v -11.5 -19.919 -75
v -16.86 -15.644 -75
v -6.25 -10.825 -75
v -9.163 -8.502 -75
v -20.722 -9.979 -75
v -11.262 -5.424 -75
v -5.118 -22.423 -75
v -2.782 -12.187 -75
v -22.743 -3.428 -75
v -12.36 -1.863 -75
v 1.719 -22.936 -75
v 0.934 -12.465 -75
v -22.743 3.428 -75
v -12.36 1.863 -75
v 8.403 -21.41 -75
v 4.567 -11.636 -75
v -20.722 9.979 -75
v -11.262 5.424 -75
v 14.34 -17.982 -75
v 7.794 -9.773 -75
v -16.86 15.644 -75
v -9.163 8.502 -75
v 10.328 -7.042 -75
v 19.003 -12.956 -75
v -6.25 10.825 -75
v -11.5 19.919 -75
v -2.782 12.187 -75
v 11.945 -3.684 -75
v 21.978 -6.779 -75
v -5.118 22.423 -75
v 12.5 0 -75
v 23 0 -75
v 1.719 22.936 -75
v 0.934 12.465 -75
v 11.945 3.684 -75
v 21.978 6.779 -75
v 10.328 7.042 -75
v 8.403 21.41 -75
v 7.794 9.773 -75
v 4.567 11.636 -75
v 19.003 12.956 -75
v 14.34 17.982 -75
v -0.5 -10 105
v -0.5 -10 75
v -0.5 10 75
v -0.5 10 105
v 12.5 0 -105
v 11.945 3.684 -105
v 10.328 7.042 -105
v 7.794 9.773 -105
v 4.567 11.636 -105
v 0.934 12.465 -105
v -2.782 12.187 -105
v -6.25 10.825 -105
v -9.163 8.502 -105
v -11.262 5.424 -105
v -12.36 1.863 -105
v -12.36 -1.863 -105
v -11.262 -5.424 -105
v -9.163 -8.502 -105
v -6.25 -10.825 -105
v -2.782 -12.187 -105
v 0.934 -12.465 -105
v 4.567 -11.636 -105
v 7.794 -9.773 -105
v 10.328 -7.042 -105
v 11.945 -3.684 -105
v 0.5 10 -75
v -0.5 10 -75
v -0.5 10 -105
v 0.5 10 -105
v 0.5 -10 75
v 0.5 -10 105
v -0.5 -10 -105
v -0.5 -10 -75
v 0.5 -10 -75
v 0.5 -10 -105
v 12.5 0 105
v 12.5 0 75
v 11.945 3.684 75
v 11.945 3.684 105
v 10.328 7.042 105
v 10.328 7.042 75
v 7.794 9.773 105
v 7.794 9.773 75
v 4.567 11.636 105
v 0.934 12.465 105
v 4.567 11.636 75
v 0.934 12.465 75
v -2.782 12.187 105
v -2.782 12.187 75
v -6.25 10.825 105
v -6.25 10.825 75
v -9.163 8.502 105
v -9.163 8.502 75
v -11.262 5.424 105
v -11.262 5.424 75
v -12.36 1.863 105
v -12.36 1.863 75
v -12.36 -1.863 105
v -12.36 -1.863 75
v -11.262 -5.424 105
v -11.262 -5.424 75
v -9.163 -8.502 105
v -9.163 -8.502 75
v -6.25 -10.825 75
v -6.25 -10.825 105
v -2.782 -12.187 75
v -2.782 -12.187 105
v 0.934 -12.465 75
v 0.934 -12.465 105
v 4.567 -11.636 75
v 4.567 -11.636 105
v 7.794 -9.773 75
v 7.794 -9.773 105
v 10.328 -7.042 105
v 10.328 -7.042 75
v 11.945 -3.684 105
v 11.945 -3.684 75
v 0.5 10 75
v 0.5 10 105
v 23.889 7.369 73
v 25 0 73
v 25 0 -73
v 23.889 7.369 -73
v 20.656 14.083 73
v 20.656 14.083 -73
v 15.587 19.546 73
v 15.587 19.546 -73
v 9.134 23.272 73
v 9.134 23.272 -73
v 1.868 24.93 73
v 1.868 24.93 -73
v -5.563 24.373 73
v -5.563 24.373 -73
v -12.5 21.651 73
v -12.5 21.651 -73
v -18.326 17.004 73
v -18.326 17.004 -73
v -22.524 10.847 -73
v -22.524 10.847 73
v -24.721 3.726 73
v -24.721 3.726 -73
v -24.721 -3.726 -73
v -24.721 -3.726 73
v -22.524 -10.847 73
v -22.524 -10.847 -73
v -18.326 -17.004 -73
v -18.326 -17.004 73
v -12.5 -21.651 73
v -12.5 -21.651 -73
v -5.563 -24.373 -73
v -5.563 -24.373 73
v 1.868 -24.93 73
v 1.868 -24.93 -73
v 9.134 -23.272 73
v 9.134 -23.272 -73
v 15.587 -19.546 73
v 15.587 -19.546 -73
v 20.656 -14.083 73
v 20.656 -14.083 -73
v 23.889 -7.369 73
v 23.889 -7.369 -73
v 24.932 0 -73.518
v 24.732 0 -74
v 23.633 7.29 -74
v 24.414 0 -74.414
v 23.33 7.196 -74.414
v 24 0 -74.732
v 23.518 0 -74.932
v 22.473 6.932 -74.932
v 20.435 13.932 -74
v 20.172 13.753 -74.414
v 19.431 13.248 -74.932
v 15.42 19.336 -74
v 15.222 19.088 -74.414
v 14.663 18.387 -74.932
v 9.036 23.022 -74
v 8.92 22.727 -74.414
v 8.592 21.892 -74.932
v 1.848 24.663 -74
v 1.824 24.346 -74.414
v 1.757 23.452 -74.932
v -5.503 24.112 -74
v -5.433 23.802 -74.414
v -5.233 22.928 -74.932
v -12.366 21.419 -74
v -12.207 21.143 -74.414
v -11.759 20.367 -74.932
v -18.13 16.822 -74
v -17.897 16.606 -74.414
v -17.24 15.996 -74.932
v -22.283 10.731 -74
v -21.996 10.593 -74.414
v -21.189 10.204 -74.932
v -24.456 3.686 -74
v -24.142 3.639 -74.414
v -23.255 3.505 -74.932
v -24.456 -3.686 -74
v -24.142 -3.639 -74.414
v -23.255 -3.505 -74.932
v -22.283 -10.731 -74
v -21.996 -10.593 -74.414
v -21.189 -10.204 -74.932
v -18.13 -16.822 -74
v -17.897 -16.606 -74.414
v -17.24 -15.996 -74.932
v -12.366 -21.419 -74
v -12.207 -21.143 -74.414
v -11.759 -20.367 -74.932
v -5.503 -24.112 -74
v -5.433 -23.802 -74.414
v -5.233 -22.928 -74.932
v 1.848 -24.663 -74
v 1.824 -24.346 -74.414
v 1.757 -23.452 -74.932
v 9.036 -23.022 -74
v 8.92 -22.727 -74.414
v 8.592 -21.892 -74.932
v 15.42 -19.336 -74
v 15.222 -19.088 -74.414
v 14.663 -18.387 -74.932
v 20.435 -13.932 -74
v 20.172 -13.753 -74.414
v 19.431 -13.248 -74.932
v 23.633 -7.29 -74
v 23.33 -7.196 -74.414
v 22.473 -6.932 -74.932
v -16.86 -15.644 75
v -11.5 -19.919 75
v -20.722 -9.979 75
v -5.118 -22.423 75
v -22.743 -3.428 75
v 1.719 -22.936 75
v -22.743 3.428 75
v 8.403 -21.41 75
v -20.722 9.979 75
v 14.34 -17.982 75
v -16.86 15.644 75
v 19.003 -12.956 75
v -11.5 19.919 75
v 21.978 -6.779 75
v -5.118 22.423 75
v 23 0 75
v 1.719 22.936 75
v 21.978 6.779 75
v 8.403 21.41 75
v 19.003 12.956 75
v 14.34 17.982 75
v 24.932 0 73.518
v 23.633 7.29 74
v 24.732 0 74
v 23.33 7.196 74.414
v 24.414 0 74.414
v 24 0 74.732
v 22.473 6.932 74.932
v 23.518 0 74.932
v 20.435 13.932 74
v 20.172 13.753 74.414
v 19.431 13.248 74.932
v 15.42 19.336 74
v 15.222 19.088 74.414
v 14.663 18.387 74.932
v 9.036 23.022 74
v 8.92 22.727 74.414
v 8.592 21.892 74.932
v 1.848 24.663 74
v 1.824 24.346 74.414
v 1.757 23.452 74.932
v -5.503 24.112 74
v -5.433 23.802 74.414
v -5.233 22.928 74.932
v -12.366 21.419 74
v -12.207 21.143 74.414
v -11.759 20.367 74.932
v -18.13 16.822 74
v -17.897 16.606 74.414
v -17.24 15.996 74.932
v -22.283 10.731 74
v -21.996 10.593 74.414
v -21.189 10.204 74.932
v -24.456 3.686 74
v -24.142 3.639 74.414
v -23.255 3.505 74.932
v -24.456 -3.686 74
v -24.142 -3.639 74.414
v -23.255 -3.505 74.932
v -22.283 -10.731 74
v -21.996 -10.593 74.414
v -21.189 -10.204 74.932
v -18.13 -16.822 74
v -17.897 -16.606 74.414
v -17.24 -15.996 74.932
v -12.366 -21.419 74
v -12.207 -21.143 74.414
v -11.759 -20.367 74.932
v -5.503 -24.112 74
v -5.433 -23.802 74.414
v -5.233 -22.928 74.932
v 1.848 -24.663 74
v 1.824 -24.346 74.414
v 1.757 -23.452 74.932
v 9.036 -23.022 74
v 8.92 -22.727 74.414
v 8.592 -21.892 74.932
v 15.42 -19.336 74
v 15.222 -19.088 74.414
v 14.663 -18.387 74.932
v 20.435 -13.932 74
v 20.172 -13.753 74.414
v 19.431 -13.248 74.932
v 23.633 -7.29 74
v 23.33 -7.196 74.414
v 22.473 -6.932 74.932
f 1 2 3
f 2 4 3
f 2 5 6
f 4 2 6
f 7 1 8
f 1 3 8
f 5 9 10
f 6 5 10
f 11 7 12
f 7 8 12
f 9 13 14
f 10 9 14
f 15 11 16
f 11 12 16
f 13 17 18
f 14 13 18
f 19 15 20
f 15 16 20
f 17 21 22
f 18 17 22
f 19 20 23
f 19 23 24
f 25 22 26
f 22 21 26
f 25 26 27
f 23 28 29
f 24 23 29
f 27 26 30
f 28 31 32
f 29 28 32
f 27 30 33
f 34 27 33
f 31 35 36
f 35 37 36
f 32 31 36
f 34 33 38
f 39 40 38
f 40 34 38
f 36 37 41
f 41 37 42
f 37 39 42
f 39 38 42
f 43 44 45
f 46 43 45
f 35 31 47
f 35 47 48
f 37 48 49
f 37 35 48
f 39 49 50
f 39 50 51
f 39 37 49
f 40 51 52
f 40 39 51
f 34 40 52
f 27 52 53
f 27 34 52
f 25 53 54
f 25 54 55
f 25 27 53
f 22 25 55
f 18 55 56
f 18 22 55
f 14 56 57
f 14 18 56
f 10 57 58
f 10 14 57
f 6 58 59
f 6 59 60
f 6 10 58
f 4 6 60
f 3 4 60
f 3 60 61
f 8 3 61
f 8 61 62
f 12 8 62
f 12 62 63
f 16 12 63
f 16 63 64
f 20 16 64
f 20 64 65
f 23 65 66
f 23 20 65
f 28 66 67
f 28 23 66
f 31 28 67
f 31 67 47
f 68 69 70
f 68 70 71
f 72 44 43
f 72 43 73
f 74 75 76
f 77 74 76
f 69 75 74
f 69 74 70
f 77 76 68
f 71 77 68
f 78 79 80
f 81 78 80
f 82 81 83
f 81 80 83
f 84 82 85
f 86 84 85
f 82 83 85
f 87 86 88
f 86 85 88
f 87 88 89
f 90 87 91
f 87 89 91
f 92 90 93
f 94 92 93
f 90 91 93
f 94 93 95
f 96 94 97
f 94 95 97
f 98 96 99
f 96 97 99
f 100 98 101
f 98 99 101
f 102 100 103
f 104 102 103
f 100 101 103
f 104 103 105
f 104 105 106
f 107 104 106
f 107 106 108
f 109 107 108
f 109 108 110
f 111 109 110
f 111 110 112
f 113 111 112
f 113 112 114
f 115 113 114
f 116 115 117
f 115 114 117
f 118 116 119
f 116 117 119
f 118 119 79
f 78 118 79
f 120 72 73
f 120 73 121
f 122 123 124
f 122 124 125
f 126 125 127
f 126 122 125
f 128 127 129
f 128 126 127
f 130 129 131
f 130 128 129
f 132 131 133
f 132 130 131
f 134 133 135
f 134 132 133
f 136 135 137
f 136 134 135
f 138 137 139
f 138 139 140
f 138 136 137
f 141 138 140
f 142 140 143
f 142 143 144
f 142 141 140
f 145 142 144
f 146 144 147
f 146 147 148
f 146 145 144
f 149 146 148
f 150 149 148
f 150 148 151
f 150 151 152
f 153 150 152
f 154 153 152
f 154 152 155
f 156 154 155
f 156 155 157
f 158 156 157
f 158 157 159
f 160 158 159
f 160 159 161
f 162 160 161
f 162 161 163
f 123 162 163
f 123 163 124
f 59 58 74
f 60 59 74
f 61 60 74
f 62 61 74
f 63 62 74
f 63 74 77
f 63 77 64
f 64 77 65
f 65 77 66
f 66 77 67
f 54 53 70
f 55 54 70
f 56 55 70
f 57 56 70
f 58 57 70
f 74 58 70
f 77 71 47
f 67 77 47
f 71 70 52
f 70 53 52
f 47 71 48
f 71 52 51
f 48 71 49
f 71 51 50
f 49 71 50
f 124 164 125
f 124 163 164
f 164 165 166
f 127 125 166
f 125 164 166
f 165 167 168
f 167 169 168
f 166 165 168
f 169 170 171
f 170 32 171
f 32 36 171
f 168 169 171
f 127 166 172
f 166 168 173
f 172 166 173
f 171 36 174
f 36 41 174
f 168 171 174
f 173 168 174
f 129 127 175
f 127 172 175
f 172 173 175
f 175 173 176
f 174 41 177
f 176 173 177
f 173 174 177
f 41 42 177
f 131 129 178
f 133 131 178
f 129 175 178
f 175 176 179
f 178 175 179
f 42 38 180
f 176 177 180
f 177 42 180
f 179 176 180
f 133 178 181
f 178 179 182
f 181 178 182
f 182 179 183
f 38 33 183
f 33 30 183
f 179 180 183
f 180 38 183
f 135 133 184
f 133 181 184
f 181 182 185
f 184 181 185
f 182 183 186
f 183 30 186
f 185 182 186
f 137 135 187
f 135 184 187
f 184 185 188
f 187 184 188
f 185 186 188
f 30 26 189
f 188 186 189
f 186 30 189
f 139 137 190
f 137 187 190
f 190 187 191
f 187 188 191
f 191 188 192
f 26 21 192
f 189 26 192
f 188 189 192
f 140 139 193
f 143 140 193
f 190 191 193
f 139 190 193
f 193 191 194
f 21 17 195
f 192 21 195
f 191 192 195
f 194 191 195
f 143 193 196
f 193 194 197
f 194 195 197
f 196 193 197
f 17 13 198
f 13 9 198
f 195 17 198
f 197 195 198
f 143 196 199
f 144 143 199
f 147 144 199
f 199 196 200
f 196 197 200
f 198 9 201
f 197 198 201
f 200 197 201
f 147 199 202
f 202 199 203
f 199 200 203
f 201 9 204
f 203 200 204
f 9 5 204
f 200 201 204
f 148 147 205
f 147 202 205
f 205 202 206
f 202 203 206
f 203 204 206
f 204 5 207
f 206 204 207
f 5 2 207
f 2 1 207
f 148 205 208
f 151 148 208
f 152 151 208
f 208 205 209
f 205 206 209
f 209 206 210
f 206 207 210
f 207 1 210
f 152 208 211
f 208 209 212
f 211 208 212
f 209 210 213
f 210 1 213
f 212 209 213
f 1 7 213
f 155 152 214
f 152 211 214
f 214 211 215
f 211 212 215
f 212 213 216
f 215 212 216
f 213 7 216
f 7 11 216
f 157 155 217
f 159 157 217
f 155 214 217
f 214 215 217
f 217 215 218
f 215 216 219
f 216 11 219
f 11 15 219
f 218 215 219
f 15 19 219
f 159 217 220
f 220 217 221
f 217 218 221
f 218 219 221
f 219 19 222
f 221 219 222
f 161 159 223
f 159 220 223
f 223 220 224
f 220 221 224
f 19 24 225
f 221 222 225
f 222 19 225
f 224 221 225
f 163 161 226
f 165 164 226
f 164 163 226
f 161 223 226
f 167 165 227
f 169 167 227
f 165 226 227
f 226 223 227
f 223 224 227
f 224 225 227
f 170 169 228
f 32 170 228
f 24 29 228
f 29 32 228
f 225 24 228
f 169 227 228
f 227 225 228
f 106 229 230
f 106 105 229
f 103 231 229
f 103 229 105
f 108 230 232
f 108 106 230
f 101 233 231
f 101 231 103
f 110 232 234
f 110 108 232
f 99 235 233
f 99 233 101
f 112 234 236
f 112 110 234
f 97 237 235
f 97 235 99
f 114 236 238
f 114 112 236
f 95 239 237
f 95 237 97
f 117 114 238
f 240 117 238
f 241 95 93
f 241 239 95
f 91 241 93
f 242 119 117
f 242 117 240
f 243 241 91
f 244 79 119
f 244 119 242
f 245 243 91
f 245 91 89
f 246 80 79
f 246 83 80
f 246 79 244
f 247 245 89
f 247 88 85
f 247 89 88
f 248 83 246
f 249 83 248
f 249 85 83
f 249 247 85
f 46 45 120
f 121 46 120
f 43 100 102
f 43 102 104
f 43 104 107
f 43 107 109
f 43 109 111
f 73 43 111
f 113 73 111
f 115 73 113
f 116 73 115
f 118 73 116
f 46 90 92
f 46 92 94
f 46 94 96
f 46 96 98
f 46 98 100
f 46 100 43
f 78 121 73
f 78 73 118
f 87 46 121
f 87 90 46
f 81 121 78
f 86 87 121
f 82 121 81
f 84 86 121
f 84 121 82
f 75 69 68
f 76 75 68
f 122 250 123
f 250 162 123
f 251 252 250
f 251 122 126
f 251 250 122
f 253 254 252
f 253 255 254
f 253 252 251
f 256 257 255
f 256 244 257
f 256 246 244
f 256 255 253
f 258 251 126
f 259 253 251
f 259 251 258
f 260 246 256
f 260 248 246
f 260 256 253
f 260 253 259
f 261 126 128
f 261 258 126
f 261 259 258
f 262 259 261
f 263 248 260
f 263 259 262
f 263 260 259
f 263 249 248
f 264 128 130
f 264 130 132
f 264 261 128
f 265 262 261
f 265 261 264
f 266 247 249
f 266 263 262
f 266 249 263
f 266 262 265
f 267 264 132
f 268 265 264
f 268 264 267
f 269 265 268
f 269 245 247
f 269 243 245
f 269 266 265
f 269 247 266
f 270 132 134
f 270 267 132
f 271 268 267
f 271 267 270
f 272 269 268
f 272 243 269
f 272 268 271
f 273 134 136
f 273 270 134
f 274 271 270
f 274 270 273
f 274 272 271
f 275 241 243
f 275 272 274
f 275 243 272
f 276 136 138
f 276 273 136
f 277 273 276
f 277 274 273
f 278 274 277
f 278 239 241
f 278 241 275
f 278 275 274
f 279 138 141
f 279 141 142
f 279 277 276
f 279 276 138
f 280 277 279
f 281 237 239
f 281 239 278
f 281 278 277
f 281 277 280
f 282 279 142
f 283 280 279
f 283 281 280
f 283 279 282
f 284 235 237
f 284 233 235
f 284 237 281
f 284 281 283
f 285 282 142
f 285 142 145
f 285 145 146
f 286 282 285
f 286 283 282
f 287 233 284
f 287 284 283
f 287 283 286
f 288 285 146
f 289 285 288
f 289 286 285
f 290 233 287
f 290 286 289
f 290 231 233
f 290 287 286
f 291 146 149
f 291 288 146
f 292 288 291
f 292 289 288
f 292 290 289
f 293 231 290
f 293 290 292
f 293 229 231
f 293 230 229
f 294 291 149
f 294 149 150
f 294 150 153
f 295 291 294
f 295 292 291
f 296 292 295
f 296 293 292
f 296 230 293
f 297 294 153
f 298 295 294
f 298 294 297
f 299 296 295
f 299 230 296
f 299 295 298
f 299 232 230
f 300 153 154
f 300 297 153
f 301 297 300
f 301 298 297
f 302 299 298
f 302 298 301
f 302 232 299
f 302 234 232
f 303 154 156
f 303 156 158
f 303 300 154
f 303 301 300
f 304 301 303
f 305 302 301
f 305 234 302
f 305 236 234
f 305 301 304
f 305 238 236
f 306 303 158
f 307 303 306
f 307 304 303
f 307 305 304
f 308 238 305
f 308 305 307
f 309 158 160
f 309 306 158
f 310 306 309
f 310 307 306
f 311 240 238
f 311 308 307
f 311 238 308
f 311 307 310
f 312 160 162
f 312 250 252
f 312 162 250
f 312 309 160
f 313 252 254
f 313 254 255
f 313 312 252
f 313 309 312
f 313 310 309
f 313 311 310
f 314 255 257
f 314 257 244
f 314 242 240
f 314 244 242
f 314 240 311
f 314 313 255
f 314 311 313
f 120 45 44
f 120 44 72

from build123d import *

# Parameters (mm, degrees)
SKETCH1_R           = 25
BOSS_EXTRUDE2_DEPTH = 75
SKETCH2_R           = 12.5
SKETCH2_W           = 1
SKETCH2_H           = 20
BOSS_EXTRUDE3_DEPTH = 30
FILLET2_R           = 2


with BuildPart() as part:
    # Sketch1 → Boss-Extrude2 (new body, symmetric)
    with BuildSketch(Plane.XY):
        Circle(SKETCH1_R)
    extrude(amount=BOSS_EXTRUDE2_DEPTH, both=True)

    # Sketch2 → Boss-Extrude3 (add)
    with BuildSketch(Plane.XY.offset(75)):
        Circle(SKETCH2_R)
        Rectangle(SKETCH2_W, SKETCH2_H, mode=Mode.SUBTRACT)
    boss_extrude3 = extrude(amount=BOSS_EXTRUDE3_DEPTH)

    # Mirror1: Boss-Extrude3 across plane
    add(boss_extrude3.mirror(Plane.XY))

    # Fillet2
    fillet2_edges = [part.edges().sort_by_distance(p)[0] for p in [
        (-25, 0, -75),
        (-25, 0, 75),
    ]]
    fillet(fillet2_edges, radius=FILLET2_R)


solid = part.part
